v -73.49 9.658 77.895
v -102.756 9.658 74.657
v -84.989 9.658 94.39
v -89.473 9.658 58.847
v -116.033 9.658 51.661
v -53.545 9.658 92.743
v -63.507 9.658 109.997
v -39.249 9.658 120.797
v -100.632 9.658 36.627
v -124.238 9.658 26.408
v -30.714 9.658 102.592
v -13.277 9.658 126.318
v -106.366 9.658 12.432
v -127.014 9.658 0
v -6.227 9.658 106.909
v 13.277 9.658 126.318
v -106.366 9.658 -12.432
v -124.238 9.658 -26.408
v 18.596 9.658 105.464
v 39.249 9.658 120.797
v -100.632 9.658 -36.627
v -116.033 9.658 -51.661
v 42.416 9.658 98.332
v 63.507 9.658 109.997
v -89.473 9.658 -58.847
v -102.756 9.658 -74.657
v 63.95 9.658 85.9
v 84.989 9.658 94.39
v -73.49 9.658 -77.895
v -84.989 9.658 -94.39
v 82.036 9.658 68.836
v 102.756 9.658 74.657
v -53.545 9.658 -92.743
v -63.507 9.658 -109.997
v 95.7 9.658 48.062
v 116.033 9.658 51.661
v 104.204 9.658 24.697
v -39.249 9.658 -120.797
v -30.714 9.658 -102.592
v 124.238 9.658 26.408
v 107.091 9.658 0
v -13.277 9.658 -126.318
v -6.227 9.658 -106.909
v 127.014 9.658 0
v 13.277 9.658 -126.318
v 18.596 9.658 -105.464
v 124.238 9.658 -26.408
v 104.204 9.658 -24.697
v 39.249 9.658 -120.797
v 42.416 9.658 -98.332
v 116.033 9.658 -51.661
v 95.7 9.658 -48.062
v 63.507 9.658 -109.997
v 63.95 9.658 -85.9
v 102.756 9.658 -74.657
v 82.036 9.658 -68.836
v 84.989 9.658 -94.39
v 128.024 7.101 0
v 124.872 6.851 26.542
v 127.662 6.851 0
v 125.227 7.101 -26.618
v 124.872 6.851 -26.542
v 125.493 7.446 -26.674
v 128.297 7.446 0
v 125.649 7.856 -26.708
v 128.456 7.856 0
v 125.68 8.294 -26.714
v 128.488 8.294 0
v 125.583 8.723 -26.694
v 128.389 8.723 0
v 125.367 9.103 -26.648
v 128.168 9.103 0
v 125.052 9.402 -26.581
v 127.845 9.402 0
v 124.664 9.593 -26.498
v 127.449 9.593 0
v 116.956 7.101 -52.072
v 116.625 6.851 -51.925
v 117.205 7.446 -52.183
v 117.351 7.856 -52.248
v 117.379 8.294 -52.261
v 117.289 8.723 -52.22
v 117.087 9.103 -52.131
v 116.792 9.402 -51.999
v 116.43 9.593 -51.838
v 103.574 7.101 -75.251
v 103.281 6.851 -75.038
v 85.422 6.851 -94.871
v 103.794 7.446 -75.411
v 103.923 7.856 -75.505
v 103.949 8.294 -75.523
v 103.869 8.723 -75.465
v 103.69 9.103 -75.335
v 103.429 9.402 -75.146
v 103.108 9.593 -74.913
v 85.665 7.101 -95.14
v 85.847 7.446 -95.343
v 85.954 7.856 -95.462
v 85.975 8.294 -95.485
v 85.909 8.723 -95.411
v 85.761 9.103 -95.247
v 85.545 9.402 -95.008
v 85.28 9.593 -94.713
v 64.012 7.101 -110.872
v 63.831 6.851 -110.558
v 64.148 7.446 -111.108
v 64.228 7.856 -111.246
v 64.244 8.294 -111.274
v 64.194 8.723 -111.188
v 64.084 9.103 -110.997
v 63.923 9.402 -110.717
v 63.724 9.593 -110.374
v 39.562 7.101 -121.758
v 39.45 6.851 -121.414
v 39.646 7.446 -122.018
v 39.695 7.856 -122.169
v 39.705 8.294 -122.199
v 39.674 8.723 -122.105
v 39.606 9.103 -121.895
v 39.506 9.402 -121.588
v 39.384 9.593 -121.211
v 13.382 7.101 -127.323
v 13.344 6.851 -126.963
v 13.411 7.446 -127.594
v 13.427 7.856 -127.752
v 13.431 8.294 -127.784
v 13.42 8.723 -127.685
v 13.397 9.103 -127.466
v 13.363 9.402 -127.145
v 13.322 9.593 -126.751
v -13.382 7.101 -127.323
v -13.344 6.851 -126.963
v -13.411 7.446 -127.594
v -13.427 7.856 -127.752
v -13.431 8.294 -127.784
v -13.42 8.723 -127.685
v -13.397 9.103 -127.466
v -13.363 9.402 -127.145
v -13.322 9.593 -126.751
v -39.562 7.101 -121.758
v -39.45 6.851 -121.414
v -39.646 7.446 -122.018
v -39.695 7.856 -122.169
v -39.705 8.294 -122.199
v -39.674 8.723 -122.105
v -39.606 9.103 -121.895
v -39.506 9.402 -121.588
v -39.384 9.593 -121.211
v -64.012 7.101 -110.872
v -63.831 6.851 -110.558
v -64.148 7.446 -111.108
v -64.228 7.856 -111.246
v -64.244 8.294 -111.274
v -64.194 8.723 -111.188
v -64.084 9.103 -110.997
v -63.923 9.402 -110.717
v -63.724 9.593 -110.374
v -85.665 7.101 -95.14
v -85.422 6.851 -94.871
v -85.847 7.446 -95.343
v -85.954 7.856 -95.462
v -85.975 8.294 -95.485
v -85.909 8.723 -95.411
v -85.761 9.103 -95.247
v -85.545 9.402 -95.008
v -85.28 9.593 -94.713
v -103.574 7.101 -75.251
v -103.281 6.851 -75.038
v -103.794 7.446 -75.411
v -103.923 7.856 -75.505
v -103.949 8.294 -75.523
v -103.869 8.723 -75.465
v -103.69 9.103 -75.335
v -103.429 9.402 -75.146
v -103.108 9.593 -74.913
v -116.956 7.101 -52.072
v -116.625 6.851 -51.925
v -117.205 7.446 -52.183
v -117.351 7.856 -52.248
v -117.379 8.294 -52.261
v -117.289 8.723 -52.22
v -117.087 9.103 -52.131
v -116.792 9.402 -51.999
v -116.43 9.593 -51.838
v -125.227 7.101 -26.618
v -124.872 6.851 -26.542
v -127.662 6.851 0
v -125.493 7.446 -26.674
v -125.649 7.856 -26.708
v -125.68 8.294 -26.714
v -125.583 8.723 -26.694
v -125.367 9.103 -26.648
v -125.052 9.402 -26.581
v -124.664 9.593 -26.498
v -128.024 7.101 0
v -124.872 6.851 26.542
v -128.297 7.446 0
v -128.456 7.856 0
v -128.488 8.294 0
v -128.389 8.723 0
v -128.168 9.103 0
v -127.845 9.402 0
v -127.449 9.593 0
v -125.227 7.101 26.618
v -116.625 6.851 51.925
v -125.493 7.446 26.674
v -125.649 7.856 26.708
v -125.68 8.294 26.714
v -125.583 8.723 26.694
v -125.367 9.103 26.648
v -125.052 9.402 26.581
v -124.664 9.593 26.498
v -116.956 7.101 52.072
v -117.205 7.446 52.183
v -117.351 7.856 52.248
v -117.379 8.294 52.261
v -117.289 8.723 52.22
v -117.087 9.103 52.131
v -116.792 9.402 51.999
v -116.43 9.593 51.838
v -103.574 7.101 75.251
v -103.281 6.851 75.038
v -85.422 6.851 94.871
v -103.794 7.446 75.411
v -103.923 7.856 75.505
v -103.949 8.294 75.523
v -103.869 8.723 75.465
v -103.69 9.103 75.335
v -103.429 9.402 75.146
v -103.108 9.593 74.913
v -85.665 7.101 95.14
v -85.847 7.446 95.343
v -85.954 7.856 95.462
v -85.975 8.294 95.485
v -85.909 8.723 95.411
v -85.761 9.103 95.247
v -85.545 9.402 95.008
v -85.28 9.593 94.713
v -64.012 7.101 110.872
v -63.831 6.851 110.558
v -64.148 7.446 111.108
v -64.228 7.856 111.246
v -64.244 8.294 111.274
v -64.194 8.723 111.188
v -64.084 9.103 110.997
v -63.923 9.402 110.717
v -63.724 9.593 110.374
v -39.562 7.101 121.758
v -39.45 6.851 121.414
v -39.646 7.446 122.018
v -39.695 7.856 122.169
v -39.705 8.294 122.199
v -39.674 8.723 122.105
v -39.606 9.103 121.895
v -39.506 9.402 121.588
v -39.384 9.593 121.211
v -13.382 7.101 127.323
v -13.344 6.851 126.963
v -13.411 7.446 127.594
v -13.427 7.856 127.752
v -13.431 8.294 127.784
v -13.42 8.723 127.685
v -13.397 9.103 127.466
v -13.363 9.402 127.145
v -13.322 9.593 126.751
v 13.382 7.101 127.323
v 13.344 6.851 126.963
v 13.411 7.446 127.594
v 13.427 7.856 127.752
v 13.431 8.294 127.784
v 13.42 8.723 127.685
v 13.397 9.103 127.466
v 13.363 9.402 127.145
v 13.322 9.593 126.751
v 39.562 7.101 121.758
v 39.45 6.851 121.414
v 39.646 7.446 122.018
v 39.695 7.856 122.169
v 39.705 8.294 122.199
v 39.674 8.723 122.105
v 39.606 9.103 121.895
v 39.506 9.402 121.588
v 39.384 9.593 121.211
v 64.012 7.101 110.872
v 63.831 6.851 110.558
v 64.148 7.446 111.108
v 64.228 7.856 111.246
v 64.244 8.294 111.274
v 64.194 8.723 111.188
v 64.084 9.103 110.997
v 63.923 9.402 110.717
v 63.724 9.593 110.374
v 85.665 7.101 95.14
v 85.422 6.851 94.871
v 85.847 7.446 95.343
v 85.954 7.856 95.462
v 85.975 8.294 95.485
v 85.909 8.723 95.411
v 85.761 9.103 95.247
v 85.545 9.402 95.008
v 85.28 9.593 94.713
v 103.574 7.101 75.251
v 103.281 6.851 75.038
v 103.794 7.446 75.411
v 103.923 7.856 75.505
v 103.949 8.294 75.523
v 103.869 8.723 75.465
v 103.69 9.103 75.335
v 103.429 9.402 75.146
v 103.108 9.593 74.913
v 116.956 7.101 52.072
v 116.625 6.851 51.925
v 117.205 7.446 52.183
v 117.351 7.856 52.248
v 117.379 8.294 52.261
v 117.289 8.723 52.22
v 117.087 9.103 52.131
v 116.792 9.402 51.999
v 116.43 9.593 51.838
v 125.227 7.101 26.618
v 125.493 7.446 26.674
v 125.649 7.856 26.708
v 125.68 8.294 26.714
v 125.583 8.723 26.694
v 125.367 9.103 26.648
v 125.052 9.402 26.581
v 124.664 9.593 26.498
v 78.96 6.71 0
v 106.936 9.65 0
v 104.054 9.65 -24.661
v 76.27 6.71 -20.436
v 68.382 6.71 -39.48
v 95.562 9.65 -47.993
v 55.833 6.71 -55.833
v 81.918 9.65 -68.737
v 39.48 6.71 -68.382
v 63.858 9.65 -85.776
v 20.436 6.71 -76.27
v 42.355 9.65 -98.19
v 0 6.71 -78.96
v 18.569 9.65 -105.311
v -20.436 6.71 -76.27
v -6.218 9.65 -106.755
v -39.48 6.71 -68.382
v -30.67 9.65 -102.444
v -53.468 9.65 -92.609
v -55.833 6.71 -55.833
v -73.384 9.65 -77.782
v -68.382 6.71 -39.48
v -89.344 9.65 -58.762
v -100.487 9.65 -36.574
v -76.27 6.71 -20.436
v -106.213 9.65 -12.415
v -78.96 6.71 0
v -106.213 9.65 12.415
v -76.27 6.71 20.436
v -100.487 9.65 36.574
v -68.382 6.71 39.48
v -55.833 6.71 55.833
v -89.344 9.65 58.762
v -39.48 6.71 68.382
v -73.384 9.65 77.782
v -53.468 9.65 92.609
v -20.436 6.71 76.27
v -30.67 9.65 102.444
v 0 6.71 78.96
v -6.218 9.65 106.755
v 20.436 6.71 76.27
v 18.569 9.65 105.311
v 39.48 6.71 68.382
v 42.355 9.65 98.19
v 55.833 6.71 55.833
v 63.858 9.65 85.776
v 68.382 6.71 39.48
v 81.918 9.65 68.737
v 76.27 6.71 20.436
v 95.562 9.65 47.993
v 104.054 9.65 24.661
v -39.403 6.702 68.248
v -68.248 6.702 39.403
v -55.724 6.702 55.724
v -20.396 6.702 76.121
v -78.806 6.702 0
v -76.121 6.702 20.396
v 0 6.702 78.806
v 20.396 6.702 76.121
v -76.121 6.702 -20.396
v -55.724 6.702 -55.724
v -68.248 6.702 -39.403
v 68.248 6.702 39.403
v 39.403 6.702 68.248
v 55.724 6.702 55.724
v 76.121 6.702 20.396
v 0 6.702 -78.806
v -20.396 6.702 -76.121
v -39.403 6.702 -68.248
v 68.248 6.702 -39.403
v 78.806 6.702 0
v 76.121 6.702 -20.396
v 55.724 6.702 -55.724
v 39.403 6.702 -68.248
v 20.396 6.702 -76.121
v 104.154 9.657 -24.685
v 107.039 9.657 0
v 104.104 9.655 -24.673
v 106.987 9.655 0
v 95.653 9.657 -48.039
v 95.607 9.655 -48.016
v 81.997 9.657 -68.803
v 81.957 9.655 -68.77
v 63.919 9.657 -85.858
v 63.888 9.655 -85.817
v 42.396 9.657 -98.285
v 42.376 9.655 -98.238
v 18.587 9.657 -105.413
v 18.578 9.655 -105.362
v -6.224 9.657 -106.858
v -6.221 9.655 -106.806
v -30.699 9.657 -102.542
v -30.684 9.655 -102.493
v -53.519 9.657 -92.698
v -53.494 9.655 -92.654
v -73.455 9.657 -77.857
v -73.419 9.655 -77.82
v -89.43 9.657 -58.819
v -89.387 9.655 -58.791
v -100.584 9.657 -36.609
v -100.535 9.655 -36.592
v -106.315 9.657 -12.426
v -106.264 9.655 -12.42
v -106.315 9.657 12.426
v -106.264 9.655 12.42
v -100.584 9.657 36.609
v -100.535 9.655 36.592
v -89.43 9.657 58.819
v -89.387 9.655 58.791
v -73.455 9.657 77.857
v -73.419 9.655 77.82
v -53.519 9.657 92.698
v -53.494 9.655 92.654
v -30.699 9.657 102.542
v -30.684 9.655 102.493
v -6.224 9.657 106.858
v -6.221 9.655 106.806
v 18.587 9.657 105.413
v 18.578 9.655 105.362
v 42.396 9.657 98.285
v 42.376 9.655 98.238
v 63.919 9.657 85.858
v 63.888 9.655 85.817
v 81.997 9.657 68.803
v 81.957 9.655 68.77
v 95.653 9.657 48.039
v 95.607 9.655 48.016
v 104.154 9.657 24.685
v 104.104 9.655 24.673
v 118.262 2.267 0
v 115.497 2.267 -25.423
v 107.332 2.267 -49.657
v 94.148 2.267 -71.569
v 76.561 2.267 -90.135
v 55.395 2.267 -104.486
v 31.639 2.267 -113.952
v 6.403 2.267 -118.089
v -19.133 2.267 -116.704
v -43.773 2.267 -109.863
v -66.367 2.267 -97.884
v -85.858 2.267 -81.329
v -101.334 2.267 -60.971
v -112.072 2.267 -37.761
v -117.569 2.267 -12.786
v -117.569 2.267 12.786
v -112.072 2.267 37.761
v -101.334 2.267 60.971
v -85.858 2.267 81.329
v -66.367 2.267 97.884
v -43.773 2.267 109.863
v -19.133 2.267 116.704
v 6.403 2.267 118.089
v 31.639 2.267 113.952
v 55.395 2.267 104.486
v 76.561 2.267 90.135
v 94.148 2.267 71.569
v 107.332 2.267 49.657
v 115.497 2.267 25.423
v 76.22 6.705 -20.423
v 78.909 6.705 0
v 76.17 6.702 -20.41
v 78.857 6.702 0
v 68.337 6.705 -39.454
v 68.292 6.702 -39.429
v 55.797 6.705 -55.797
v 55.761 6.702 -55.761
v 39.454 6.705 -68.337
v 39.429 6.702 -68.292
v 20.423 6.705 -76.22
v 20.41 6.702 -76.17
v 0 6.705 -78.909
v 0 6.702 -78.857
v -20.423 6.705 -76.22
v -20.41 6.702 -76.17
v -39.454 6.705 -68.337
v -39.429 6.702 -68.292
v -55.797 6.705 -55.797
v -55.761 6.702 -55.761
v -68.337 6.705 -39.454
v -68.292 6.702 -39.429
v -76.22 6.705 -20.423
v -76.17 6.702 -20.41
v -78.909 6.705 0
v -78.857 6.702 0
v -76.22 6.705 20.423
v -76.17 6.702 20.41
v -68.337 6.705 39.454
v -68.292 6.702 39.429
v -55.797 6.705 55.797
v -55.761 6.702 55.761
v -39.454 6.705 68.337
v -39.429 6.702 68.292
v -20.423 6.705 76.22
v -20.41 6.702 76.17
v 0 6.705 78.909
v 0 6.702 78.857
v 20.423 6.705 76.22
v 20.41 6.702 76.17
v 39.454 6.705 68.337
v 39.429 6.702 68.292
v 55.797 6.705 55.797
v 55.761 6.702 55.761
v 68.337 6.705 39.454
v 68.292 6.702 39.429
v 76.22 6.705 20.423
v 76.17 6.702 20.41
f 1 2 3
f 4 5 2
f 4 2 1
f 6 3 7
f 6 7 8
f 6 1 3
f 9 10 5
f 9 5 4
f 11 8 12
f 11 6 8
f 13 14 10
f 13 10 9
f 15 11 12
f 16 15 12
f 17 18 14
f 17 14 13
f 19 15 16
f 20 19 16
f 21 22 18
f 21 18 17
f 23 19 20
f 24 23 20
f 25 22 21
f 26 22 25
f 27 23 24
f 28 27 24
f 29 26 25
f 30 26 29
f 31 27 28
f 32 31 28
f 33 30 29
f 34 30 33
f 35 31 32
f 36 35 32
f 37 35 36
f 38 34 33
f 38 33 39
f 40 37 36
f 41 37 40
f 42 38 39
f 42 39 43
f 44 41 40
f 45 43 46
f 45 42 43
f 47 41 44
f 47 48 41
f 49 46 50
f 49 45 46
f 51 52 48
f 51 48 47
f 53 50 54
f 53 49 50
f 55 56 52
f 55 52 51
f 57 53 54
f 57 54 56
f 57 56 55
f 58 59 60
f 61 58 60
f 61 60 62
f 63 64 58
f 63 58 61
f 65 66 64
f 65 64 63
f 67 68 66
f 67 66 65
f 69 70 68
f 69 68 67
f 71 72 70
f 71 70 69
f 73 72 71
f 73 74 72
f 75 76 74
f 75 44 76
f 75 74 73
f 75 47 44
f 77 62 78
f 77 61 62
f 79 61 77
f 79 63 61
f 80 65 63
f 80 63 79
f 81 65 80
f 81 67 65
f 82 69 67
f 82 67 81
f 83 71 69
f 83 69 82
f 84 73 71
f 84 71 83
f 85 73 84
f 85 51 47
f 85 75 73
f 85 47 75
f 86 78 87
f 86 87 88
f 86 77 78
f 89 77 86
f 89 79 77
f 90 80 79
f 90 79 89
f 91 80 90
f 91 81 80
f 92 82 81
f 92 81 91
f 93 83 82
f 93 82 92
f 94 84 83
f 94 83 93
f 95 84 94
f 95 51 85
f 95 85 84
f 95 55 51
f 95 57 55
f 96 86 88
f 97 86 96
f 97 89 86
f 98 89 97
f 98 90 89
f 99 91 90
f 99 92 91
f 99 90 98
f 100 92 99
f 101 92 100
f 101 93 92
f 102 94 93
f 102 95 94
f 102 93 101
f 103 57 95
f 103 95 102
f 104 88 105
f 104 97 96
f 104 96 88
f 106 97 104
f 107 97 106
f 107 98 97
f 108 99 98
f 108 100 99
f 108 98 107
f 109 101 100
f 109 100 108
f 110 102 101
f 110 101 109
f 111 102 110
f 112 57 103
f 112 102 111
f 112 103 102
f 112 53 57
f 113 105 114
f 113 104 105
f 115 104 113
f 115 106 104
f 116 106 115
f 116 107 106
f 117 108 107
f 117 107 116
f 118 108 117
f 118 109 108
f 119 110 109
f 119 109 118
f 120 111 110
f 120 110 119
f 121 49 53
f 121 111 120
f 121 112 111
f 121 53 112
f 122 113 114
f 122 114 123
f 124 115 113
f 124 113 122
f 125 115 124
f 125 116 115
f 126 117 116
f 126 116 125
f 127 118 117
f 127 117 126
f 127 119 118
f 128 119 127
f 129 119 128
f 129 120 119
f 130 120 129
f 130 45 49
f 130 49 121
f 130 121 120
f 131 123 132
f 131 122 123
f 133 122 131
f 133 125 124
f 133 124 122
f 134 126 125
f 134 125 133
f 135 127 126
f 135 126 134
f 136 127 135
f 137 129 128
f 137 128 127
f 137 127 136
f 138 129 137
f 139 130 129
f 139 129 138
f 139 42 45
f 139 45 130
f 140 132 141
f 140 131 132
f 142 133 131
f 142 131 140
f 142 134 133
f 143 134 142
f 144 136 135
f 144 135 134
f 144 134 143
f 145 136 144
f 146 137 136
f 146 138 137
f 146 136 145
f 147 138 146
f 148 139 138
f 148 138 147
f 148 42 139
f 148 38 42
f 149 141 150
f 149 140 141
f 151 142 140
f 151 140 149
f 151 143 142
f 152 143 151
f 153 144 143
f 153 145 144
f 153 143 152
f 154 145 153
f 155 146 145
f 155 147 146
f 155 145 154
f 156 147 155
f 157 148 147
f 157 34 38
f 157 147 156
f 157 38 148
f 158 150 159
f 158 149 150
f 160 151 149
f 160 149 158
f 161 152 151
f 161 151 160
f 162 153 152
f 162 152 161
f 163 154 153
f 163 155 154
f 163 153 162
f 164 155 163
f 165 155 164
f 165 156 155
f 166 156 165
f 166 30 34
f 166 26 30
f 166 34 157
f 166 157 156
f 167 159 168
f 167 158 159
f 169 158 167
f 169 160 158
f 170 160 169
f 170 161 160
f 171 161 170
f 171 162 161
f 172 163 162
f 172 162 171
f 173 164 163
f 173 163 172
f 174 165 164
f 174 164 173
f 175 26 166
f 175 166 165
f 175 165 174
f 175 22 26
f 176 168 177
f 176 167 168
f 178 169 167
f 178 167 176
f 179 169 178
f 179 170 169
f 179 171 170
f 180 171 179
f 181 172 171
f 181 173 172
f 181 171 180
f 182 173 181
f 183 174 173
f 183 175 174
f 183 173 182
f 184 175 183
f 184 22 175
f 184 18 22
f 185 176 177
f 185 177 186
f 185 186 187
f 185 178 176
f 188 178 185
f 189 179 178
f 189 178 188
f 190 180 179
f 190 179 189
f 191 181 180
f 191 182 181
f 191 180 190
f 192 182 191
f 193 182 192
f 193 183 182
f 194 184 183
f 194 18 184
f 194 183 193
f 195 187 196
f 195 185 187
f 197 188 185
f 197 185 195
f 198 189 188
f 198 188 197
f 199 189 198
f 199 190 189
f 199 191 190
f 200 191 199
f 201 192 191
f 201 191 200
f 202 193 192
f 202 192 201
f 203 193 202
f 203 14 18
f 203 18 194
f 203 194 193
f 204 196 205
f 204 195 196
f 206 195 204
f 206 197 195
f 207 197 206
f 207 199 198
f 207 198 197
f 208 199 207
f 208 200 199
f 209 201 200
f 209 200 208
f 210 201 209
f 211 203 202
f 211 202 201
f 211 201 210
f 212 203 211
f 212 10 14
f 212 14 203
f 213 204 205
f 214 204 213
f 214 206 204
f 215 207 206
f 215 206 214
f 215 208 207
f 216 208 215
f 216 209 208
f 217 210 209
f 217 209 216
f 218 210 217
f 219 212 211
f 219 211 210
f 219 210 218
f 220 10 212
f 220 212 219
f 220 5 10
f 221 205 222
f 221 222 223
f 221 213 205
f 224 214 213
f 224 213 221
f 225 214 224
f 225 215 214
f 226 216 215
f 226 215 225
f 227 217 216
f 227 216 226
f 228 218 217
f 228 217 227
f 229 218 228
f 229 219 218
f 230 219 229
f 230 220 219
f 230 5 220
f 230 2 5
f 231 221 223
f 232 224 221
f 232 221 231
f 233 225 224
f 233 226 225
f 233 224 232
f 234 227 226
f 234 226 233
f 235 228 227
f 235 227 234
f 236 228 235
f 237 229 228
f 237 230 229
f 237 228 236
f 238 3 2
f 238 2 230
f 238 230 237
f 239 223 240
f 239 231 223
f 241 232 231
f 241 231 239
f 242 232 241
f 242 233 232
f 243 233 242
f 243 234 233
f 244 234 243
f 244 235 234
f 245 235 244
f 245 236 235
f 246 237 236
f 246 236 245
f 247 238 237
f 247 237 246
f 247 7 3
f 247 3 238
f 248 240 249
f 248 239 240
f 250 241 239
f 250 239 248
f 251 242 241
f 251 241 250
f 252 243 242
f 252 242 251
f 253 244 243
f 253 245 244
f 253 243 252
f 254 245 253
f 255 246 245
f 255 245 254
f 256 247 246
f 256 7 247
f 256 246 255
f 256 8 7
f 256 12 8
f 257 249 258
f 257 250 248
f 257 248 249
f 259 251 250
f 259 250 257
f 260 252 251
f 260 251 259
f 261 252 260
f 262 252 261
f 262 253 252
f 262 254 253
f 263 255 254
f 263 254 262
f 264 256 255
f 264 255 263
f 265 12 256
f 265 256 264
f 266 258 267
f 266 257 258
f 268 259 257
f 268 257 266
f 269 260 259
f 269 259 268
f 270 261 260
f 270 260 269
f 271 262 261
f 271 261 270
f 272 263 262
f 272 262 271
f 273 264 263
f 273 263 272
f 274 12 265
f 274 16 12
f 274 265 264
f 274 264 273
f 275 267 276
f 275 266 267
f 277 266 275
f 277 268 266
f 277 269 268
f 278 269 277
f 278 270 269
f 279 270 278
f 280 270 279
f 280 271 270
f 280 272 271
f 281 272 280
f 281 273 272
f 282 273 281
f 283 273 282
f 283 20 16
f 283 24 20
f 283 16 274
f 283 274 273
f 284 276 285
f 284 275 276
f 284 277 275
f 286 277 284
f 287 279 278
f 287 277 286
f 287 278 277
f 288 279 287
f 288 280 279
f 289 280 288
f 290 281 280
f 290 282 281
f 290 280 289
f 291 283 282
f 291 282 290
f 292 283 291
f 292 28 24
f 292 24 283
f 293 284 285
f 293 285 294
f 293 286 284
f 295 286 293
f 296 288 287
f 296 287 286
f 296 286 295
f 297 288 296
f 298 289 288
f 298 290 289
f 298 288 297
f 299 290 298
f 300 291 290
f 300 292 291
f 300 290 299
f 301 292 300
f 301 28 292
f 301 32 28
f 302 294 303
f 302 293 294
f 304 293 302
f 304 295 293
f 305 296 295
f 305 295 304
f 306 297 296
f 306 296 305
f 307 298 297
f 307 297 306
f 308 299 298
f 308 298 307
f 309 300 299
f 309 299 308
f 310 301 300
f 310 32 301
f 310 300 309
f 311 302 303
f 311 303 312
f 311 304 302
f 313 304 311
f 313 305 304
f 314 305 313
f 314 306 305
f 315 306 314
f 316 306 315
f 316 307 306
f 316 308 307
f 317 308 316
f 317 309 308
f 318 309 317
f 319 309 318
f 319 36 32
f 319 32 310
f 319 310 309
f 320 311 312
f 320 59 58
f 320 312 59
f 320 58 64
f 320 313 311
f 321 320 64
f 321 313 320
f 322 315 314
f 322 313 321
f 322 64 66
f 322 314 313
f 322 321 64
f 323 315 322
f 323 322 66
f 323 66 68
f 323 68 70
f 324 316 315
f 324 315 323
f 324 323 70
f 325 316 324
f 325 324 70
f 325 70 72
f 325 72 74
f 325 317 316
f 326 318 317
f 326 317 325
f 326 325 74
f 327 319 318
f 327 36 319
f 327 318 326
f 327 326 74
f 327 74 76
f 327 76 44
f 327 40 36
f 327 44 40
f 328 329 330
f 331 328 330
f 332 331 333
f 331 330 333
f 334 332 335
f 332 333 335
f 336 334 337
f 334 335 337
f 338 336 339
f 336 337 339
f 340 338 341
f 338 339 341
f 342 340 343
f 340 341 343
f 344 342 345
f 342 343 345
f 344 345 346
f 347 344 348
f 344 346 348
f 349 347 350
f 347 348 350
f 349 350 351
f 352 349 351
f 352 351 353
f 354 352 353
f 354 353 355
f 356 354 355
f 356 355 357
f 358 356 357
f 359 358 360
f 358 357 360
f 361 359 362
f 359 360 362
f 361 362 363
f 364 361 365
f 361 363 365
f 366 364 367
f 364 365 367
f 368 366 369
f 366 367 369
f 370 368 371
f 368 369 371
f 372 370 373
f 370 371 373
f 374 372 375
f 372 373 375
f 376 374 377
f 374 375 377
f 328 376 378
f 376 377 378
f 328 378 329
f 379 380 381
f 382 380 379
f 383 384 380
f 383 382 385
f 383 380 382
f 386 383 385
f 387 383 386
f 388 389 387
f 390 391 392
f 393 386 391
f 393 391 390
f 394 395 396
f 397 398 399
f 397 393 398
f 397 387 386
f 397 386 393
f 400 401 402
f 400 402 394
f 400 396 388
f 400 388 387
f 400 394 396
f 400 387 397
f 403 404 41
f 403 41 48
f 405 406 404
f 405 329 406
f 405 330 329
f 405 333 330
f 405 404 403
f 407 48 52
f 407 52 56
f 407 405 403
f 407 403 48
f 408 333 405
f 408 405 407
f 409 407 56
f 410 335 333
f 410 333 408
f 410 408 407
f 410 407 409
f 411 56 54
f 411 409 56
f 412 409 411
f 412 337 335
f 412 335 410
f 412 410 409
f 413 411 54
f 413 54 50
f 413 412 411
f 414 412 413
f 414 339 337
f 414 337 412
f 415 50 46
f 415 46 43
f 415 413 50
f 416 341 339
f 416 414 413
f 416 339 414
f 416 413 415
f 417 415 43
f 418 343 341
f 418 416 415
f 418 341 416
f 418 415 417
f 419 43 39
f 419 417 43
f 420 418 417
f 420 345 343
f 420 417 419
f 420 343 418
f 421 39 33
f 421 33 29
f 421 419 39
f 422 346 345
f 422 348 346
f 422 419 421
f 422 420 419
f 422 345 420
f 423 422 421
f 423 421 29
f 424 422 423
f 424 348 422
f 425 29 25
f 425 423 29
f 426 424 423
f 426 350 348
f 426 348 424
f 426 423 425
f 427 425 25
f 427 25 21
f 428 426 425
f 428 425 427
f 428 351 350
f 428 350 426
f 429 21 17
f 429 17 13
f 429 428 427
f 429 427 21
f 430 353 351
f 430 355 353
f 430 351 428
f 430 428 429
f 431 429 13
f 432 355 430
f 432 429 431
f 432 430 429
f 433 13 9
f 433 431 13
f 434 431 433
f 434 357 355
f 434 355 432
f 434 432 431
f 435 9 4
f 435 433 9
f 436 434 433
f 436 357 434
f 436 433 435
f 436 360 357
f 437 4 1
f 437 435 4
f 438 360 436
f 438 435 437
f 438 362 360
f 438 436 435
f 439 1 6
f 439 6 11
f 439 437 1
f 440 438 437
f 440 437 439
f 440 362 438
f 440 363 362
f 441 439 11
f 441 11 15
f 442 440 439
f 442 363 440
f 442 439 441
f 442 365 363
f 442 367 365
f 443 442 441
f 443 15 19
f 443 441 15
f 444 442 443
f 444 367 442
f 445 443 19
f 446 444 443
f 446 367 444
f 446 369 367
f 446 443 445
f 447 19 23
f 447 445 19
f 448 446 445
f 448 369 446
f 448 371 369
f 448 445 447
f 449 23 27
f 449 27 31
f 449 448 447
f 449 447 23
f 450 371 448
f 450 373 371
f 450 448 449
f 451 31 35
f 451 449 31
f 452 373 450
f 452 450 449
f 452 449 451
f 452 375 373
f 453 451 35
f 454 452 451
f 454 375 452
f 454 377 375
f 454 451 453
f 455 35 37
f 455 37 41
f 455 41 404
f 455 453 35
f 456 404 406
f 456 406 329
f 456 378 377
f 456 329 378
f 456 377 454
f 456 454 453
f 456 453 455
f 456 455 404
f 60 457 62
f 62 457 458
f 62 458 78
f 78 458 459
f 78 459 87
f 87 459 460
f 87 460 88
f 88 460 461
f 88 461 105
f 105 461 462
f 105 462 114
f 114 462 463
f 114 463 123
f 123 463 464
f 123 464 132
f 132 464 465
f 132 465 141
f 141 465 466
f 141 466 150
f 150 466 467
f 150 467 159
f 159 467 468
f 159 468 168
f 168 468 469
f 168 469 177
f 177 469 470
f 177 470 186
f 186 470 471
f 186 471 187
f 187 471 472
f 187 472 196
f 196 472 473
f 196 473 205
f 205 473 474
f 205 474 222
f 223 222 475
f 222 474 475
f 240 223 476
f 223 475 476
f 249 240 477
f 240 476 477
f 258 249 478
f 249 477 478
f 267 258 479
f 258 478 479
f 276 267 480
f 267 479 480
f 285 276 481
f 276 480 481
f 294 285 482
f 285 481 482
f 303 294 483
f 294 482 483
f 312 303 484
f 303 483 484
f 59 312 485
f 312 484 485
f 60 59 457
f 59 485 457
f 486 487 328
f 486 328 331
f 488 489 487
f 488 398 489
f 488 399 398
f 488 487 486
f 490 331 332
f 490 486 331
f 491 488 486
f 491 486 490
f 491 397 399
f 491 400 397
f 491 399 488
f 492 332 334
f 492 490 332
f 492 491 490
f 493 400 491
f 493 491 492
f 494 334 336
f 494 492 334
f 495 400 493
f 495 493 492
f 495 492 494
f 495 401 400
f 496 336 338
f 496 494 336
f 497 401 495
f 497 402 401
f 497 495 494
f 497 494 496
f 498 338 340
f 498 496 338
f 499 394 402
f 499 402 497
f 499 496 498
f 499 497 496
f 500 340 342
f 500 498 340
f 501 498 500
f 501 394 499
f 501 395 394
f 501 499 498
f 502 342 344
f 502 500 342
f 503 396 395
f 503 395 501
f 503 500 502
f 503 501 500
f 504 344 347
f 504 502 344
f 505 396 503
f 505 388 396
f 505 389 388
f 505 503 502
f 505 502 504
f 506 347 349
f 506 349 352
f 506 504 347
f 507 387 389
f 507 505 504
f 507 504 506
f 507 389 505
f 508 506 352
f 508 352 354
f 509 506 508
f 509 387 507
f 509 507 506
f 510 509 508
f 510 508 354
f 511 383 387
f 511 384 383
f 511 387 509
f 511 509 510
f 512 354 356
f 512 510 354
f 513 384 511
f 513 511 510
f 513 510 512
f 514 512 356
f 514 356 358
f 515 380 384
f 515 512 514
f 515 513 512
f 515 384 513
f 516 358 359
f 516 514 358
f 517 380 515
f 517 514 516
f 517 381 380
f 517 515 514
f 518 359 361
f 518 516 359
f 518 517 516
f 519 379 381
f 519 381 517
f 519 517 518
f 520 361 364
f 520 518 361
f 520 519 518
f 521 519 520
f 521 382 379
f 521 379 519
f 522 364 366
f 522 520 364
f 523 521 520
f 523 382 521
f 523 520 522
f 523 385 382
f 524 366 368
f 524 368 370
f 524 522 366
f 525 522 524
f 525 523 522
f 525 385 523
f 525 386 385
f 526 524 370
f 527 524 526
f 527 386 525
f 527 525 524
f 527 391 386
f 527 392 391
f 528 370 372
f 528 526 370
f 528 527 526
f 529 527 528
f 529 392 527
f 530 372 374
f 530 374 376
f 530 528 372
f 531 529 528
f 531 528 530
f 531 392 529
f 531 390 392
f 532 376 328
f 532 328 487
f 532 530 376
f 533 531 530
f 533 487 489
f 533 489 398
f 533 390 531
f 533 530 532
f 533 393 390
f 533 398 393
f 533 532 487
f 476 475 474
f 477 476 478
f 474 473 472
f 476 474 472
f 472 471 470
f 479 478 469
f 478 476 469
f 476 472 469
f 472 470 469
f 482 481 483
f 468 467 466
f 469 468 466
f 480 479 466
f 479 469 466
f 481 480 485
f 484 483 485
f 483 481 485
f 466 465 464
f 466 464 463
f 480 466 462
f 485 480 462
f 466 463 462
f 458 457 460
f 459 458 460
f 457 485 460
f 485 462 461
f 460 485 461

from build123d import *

# Parameters (mm, degrees)
SKETCH1_R           = 203.2
BOSS_EXTRUDE1_DEPTH = 12.7
BOSS_EXTRUDE1_DRAFT = -63.999999999
SKETCH2_R           = 183.871225213
CUT_EXTRUDE1_DEPTH  = 5.08
CUT_EXTRUDE1_DRAFT  = -83.999999999
FILLET1_R           = 2.54
SCALE1_SCALE        = 0.582


with BuildPart() as part:
    # Sketch1 → Boss-Extrude1 (with draft: the straight prism first)
    with BuildSketch(Plane(origin=(0, 0, 0), x_dir=(1, 0, 0), z_dir=(0, 1, 0))):
        Circle(SKETCH1_R)
    extrude(amount=BOSS_EXTRUDE1_DEPTH)
    # Boss-Extrude1: the draft: its side faces are tilted about the plane it starts from
    boss_extrude1_sides = [part.faces().sort_by_distance(p)[0] for p in [
        (-203.2, 6.35, 0),
    ]]
    draft(boss_extrude1_sides, Plane(origin=(0, 0, 0), x_dir=(1, 0, 0), z_dir=(0, 1, 0)), BOSS_EXTRUDE1_DRAFT)


with BuildPart() as cut_extrude1_tool:
    # Sketch2 → Cut-Extrude1 (with draft: the straight prism first)
    with BuildSketch(Plane(origin=(0, 12.7, 0), x_dir=(1, 0, 0), z_dir=(0, 1, 0))):
        Circle(SKETCH2_R)
    extrude(amount=-CUT_EXTRUDE1_DEPTH)
    # Cut-Extrude1: the draft: its side faces are tilted about the plane it starts from
    cut_extrude1_sides = [cut_extrude1_tool.faces().sort_by_distance(p)[0] for p in [
        (-183.871225213, 10.16, 0),
    ]]
    draft(cut_extrude1_sides, Plane(origin=(0, 12.7, 0), x_dir=(1, 0, 0), z_dir=(0, 1, 0)), CUT_EXTRUDE1_DRAFT)


with BuildPart() as part_1:
    add(part.part)

    # Cut-Extrude1: cut by cut_extrude1_tool
    add(cut_extrude1_tool.part, mode=Mode.SUBTRACT)

    # Fillet1
    fillet1_edges = [part_1.edges().sort_by_distance(p)[0] for p in [
        (-229.238858787, 12.7, 0),
        (-135.53825379, 7.62, 0),
        (-183.871225213, 12.7, 0),
    ]]
    fillet(fillet1_edges, radius=FILLET1_R)


with BuildPart() as part_2:
    # Scale1: scaled about (0, 5.422815949, 0)
    add(part_1.part.scale(SCALE1_SCALE).moved(Location((0, 2.266737067, 0))))


solid = part_2.part
